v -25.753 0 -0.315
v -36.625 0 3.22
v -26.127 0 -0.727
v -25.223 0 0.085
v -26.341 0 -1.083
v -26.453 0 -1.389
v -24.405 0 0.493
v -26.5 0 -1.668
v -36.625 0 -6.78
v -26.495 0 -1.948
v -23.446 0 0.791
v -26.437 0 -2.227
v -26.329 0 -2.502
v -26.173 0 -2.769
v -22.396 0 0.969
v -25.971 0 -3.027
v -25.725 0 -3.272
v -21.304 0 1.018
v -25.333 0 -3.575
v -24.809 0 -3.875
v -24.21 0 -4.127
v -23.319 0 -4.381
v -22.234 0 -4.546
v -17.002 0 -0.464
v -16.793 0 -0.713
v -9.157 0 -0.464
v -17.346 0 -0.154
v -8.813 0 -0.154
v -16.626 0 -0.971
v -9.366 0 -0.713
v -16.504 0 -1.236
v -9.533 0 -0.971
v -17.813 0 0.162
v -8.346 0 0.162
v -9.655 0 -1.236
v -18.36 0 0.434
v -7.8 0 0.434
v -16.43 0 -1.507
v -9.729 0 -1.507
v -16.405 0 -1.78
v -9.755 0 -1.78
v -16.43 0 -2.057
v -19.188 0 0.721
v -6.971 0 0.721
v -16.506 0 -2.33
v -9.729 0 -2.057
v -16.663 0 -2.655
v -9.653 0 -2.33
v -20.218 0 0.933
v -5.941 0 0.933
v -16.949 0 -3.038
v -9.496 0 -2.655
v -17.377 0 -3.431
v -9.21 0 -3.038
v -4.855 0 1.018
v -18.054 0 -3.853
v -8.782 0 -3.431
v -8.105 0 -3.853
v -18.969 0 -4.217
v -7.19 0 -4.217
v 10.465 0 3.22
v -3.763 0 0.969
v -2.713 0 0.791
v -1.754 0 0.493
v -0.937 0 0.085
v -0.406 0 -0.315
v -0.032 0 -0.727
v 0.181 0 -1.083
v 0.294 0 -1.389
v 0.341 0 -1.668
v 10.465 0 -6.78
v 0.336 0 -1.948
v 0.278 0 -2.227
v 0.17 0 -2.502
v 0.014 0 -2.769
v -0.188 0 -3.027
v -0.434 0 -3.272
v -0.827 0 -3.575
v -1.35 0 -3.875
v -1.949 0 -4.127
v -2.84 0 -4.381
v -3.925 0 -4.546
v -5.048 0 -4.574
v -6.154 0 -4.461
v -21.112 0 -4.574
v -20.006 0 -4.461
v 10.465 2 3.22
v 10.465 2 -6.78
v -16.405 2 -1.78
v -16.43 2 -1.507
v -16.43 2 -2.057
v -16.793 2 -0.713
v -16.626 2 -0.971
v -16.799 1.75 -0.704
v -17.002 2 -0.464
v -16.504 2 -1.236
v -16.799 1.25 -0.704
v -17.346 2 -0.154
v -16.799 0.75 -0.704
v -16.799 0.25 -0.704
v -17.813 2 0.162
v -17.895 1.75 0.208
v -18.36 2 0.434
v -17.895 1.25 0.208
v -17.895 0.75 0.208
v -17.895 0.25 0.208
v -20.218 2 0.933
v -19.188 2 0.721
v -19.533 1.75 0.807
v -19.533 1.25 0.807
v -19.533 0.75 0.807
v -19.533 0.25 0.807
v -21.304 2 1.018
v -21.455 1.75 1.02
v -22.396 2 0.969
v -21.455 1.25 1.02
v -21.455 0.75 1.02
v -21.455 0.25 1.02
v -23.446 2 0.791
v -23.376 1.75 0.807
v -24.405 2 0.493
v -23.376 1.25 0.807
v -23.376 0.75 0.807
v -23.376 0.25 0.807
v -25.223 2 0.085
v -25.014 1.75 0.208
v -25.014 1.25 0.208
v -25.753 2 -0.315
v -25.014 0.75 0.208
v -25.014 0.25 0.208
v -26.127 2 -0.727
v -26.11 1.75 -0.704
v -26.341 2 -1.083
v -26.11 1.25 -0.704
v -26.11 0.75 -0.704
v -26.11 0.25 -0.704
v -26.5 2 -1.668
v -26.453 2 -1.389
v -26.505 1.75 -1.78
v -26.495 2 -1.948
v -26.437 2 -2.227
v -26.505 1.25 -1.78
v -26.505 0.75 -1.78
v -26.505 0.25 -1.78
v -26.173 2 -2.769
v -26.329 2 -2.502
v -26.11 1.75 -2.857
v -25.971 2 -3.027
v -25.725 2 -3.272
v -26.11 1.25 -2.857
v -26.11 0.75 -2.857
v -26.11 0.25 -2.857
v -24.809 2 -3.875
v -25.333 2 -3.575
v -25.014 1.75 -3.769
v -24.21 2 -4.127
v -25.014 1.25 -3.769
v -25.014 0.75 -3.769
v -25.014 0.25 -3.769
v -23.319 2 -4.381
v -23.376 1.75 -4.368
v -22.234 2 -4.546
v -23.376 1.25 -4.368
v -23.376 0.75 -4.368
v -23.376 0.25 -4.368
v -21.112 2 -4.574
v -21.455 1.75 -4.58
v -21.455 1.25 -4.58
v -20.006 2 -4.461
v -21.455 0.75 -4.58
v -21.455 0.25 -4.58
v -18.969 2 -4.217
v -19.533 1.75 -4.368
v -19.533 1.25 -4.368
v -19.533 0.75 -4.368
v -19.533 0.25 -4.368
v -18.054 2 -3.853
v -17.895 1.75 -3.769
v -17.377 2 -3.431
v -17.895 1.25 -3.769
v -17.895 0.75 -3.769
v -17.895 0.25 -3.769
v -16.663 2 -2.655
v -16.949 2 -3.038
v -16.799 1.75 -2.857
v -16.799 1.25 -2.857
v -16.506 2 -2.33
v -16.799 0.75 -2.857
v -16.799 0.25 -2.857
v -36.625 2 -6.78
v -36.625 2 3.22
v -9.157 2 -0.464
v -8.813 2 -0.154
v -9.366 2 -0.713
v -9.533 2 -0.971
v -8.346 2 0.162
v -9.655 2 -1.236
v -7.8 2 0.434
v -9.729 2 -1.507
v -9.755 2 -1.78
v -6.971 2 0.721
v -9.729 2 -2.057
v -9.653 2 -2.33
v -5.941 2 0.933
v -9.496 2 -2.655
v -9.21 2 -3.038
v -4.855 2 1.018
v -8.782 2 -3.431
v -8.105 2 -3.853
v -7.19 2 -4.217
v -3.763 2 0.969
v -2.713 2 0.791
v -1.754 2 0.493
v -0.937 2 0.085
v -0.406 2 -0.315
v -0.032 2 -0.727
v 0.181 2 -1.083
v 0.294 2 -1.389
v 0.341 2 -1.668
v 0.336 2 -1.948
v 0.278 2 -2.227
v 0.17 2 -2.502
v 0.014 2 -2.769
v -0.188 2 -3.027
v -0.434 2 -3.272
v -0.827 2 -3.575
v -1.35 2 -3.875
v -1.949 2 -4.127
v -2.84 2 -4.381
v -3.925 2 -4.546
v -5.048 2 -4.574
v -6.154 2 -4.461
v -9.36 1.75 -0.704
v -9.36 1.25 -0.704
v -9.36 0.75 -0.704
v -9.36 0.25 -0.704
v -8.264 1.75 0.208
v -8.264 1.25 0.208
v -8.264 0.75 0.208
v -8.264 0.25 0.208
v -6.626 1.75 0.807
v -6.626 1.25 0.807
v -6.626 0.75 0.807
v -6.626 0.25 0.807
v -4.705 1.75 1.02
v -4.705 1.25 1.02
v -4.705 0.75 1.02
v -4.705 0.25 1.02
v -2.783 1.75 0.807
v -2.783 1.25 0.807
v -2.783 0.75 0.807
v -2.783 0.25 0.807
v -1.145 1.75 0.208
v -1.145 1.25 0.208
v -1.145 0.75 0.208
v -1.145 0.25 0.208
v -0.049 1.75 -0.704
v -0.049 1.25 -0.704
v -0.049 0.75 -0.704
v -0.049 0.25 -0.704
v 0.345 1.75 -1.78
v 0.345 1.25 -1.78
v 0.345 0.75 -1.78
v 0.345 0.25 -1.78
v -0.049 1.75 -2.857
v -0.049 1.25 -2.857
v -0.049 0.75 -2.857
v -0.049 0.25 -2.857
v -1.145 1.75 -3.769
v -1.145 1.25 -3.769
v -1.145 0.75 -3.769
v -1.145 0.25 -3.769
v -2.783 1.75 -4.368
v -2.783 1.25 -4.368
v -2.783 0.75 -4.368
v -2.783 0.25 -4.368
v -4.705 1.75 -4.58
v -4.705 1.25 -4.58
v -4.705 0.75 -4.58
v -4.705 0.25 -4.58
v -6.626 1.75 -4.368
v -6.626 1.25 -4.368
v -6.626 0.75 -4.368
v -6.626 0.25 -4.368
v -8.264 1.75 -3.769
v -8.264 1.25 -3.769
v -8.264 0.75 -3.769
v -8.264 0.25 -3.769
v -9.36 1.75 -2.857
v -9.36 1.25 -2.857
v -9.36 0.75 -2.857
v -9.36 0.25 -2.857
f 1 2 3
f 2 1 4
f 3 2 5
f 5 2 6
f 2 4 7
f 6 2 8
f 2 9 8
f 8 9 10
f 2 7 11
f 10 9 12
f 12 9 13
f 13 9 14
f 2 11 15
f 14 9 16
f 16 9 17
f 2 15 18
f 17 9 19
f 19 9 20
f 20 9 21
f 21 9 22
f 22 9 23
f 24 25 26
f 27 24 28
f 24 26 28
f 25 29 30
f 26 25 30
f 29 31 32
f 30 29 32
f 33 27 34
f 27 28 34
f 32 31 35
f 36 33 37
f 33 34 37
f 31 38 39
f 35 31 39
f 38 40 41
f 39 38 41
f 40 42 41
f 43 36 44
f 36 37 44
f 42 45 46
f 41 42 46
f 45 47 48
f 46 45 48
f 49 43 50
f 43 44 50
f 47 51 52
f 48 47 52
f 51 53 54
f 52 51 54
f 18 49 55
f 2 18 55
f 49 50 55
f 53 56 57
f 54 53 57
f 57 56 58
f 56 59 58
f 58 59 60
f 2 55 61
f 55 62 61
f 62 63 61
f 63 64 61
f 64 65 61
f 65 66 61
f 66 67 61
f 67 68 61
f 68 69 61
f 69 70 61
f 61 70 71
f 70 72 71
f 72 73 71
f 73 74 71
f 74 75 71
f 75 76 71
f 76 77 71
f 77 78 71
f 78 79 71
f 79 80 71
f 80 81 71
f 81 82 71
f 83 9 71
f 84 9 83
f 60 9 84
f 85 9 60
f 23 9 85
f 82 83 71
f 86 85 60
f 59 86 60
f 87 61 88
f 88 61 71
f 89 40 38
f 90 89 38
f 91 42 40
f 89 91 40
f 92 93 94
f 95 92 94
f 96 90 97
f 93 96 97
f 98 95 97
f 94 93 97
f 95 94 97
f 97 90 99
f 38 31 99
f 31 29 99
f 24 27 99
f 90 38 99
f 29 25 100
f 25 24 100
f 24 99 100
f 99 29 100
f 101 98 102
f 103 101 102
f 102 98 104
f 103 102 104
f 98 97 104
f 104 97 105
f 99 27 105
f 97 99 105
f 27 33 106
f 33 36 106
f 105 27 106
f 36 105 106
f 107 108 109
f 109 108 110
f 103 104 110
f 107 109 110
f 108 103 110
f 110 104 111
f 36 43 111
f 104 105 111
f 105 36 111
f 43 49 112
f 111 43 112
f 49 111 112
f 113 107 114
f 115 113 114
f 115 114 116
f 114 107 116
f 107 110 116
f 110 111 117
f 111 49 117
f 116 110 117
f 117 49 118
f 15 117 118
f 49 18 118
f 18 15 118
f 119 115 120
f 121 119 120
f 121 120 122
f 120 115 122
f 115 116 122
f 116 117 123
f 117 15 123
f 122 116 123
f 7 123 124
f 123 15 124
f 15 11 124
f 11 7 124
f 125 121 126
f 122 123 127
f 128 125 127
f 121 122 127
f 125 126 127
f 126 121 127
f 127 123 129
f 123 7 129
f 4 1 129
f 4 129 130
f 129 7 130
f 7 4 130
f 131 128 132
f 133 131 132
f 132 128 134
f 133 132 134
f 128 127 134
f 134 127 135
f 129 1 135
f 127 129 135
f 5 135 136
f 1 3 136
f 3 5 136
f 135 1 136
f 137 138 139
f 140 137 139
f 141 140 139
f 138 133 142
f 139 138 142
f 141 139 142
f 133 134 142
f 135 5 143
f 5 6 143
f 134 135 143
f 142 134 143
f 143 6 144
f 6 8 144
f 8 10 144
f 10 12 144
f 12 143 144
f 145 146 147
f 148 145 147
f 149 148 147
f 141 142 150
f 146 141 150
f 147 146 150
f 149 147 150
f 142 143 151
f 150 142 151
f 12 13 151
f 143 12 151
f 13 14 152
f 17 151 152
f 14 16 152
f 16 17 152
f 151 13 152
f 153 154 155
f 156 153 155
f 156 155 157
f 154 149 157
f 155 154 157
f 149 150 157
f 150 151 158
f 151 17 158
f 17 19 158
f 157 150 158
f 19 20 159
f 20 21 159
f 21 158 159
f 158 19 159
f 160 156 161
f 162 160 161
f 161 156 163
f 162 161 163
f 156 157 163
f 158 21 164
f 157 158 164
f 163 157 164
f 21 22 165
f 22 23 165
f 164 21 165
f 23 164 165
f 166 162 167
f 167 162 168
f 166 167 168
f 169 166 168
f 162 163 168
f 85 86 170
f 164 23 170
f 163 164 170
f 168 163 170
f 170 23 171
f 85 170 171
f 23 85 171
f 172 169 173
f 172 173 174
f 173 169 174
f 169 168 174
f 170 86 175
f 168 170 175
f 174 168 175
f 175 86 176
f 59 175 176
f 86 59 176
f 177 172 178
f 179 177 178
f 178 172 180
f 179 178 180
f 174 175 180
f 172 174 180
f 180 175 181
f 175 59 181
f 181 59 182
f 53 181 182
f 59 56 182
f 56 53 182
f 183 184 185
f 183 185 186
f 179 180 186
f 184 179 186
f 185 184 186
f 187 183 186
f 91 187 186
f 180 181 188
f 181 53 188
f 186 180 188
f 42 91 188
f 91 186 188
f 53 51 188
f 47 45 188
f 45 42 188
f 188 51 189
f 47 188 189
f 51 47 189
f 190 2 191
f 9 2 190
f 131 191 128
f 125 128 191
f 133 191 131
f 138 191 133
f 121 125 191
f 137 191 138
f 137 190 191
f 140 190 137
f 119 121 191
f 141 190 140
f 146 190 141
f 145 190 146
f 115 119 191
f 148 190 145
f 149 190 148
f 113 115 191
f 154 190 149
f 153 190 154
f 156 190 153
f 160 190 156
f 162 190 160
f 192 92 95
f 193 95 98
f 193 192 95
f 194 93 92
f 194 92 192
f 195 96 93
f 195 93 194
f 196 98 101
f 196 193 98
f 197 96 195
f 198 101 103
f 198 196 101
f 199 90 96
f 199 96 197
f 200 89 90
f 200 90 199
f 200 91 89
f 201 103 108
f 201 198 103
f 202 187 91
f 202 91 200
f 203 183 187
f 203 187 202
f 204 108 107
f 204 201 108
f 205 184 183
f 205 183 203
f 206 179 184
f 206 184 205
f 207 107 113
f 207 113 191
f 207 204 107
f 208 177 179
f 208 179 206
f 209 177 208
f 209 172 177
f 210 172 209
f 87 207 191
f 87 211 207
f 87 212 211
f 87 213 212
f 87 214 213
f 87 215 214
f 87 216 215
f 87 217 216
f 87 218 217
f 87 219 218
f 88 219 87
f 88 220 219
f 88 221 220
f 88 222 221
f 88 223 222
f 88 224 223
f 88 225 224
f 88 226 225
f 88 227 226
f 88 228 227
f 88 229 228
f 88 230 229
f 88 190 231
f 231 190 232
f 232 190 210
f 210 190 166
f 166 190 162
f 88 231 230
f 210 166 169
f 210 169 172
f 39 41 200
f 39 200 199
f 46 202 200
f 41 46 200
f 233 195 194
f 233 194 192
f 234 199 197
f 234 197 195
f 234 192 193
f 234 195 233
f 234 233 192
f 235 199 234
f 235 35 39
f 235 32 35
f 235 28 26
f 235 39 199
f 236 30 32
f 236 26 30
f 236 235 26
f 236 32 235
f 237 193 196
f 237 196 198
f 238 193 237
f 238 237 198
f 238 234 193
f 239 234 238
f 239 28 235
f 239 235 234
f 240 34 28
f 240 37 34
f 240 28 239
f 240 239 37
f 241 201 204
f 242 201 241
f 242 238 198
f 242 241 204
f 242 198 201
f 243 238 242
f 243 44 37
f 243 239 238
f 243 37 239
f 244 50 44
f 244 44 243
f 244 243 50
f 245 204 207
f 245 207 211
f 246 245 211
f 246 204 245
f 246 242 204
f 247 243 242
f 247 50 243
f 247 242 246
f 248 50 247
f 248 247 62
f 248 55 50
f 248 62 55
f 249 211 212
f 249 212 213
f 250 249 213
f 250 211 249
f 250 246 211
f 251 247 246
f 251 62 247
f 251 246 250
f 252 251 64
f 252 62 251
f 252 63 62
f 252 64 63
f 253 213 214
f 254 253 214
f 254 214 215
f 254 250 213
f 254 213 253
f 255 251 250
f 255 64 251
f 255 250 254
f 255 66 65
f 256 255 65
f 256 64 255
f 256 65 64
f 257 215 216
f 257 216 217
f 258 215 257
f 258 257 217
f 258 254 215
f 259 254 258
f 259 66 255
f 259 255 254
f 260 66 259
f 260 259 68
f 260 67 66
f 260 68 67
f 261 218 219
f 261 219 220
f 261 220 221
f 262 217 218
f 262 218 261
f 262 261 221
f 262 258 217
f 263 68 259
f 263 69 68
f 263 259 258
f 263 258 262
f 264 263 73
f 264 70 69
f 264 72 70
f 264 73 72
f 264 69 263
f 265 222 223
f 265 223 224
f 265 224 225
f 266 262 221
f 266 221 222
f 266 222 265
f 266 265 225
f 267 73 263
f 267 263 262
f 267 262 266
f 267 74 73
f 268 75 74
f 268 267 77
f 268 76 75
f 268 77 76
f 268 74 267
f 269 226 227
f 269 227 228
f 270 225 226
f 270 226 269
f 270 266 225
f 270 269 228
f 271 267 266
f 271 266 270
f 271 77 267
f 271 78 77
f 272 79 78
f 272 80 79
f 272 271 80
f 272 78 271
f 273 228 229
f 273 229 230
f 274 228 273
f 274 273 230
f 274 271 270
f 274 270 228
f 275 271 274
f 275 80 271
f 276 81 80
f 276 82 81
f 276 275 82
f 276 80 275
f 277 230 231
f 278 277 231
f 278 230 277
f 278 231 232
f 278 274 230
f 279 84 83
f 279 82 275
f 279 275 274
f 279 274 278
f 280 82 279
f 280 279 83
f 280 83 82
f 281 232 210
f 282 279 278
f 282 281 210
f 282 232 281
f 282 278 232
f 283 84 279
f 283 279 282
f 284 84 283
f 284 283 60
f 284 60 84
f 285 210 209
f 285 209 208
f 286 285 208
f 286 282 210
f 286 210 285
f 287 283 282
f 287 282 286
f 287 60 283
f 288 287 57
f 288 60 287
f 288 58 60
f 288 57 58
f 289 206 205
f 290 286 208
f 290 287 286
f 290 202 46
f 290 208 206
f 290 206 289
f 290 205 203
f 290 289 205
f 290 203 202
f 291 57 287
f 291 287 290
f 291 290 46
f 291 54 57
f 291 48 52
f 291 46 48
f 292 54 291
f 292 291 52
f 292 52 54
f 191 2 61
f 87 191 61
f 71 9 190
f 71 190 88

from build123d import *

# Parameters (mm, degrees)
SKETCH1_W           = 47.09
SKETCH1_H           = 10
BOSS_EXTRUDE1_DEPTH = 2


with BuildPart() as part:
    # Sketch1 → Boss-Extrude1 (new body)
    with BuildSketch(Plane(origin=(0, 0, 0), x_dir=(1, 0, 0), z_dir=(0, 1, 0))):
        with Locations((-13.079545455, 1.78030303)):
            Rectangle(SKETCH1_W, SKETCH1_H)
        with BuildLine():
            add(Edge.make_bspline(
                [(-9.754545455, 1.78030303), (-9.754545455, 1.044100491), (-8.642482329, -0.428304587), (-4.704545455, -1.315393161), (-0.76660858, -0.428304587), (0.901486108, 1.78030303), (-0.76660858, 3.988910648), (-4.704545455, 4.875999221), (-8.642482329, 3.988910648), (-9.754545455, 2.51650557), (-9.754545455, 1.78030303)],
                knots=[0, 0, 0, 0, 0.785398163, 1.570796327, 2.35619449, 3.141592654, 3.926990817, 4.71238898, 5.497787144, 6.283185307, 6.283185307, 6.283185307, 6.283185307], degree=3))
        make_face(mode=Mode.SUBTRACT)
        with BuildLine():
            add(Edge.make_bspline(
                [(-16.404545455, 1.78030303), (-16.404545455, 1.044100491), (-17.51660858, -0.428304587), (-21.454545455, -1.315393161), (-25.392482329, -0.428304587), (-27.060577017, 1.78030303), (-25.392482329, 3.988910648), (-21.454545455, 4.875999221), (-17.51660858, 3.988910648), (-16.404545455, 2.51650557), (-16.404545455, 1.78030303)],
                knots=[0, 0, 0, 0, 0.785398163, 1.570796327, 2.35619449, 3.141592654, 3.926990817, 4.71238898, 5.497787144, 6.283185307, 6.283185307, 6.283185307, 6.283185307], degree=3))
        make_face(mode=Mode.SUBTRACT)
    extrude(amount=BOSS_EXTRUDE1_DEPTH)


solid = part.part
